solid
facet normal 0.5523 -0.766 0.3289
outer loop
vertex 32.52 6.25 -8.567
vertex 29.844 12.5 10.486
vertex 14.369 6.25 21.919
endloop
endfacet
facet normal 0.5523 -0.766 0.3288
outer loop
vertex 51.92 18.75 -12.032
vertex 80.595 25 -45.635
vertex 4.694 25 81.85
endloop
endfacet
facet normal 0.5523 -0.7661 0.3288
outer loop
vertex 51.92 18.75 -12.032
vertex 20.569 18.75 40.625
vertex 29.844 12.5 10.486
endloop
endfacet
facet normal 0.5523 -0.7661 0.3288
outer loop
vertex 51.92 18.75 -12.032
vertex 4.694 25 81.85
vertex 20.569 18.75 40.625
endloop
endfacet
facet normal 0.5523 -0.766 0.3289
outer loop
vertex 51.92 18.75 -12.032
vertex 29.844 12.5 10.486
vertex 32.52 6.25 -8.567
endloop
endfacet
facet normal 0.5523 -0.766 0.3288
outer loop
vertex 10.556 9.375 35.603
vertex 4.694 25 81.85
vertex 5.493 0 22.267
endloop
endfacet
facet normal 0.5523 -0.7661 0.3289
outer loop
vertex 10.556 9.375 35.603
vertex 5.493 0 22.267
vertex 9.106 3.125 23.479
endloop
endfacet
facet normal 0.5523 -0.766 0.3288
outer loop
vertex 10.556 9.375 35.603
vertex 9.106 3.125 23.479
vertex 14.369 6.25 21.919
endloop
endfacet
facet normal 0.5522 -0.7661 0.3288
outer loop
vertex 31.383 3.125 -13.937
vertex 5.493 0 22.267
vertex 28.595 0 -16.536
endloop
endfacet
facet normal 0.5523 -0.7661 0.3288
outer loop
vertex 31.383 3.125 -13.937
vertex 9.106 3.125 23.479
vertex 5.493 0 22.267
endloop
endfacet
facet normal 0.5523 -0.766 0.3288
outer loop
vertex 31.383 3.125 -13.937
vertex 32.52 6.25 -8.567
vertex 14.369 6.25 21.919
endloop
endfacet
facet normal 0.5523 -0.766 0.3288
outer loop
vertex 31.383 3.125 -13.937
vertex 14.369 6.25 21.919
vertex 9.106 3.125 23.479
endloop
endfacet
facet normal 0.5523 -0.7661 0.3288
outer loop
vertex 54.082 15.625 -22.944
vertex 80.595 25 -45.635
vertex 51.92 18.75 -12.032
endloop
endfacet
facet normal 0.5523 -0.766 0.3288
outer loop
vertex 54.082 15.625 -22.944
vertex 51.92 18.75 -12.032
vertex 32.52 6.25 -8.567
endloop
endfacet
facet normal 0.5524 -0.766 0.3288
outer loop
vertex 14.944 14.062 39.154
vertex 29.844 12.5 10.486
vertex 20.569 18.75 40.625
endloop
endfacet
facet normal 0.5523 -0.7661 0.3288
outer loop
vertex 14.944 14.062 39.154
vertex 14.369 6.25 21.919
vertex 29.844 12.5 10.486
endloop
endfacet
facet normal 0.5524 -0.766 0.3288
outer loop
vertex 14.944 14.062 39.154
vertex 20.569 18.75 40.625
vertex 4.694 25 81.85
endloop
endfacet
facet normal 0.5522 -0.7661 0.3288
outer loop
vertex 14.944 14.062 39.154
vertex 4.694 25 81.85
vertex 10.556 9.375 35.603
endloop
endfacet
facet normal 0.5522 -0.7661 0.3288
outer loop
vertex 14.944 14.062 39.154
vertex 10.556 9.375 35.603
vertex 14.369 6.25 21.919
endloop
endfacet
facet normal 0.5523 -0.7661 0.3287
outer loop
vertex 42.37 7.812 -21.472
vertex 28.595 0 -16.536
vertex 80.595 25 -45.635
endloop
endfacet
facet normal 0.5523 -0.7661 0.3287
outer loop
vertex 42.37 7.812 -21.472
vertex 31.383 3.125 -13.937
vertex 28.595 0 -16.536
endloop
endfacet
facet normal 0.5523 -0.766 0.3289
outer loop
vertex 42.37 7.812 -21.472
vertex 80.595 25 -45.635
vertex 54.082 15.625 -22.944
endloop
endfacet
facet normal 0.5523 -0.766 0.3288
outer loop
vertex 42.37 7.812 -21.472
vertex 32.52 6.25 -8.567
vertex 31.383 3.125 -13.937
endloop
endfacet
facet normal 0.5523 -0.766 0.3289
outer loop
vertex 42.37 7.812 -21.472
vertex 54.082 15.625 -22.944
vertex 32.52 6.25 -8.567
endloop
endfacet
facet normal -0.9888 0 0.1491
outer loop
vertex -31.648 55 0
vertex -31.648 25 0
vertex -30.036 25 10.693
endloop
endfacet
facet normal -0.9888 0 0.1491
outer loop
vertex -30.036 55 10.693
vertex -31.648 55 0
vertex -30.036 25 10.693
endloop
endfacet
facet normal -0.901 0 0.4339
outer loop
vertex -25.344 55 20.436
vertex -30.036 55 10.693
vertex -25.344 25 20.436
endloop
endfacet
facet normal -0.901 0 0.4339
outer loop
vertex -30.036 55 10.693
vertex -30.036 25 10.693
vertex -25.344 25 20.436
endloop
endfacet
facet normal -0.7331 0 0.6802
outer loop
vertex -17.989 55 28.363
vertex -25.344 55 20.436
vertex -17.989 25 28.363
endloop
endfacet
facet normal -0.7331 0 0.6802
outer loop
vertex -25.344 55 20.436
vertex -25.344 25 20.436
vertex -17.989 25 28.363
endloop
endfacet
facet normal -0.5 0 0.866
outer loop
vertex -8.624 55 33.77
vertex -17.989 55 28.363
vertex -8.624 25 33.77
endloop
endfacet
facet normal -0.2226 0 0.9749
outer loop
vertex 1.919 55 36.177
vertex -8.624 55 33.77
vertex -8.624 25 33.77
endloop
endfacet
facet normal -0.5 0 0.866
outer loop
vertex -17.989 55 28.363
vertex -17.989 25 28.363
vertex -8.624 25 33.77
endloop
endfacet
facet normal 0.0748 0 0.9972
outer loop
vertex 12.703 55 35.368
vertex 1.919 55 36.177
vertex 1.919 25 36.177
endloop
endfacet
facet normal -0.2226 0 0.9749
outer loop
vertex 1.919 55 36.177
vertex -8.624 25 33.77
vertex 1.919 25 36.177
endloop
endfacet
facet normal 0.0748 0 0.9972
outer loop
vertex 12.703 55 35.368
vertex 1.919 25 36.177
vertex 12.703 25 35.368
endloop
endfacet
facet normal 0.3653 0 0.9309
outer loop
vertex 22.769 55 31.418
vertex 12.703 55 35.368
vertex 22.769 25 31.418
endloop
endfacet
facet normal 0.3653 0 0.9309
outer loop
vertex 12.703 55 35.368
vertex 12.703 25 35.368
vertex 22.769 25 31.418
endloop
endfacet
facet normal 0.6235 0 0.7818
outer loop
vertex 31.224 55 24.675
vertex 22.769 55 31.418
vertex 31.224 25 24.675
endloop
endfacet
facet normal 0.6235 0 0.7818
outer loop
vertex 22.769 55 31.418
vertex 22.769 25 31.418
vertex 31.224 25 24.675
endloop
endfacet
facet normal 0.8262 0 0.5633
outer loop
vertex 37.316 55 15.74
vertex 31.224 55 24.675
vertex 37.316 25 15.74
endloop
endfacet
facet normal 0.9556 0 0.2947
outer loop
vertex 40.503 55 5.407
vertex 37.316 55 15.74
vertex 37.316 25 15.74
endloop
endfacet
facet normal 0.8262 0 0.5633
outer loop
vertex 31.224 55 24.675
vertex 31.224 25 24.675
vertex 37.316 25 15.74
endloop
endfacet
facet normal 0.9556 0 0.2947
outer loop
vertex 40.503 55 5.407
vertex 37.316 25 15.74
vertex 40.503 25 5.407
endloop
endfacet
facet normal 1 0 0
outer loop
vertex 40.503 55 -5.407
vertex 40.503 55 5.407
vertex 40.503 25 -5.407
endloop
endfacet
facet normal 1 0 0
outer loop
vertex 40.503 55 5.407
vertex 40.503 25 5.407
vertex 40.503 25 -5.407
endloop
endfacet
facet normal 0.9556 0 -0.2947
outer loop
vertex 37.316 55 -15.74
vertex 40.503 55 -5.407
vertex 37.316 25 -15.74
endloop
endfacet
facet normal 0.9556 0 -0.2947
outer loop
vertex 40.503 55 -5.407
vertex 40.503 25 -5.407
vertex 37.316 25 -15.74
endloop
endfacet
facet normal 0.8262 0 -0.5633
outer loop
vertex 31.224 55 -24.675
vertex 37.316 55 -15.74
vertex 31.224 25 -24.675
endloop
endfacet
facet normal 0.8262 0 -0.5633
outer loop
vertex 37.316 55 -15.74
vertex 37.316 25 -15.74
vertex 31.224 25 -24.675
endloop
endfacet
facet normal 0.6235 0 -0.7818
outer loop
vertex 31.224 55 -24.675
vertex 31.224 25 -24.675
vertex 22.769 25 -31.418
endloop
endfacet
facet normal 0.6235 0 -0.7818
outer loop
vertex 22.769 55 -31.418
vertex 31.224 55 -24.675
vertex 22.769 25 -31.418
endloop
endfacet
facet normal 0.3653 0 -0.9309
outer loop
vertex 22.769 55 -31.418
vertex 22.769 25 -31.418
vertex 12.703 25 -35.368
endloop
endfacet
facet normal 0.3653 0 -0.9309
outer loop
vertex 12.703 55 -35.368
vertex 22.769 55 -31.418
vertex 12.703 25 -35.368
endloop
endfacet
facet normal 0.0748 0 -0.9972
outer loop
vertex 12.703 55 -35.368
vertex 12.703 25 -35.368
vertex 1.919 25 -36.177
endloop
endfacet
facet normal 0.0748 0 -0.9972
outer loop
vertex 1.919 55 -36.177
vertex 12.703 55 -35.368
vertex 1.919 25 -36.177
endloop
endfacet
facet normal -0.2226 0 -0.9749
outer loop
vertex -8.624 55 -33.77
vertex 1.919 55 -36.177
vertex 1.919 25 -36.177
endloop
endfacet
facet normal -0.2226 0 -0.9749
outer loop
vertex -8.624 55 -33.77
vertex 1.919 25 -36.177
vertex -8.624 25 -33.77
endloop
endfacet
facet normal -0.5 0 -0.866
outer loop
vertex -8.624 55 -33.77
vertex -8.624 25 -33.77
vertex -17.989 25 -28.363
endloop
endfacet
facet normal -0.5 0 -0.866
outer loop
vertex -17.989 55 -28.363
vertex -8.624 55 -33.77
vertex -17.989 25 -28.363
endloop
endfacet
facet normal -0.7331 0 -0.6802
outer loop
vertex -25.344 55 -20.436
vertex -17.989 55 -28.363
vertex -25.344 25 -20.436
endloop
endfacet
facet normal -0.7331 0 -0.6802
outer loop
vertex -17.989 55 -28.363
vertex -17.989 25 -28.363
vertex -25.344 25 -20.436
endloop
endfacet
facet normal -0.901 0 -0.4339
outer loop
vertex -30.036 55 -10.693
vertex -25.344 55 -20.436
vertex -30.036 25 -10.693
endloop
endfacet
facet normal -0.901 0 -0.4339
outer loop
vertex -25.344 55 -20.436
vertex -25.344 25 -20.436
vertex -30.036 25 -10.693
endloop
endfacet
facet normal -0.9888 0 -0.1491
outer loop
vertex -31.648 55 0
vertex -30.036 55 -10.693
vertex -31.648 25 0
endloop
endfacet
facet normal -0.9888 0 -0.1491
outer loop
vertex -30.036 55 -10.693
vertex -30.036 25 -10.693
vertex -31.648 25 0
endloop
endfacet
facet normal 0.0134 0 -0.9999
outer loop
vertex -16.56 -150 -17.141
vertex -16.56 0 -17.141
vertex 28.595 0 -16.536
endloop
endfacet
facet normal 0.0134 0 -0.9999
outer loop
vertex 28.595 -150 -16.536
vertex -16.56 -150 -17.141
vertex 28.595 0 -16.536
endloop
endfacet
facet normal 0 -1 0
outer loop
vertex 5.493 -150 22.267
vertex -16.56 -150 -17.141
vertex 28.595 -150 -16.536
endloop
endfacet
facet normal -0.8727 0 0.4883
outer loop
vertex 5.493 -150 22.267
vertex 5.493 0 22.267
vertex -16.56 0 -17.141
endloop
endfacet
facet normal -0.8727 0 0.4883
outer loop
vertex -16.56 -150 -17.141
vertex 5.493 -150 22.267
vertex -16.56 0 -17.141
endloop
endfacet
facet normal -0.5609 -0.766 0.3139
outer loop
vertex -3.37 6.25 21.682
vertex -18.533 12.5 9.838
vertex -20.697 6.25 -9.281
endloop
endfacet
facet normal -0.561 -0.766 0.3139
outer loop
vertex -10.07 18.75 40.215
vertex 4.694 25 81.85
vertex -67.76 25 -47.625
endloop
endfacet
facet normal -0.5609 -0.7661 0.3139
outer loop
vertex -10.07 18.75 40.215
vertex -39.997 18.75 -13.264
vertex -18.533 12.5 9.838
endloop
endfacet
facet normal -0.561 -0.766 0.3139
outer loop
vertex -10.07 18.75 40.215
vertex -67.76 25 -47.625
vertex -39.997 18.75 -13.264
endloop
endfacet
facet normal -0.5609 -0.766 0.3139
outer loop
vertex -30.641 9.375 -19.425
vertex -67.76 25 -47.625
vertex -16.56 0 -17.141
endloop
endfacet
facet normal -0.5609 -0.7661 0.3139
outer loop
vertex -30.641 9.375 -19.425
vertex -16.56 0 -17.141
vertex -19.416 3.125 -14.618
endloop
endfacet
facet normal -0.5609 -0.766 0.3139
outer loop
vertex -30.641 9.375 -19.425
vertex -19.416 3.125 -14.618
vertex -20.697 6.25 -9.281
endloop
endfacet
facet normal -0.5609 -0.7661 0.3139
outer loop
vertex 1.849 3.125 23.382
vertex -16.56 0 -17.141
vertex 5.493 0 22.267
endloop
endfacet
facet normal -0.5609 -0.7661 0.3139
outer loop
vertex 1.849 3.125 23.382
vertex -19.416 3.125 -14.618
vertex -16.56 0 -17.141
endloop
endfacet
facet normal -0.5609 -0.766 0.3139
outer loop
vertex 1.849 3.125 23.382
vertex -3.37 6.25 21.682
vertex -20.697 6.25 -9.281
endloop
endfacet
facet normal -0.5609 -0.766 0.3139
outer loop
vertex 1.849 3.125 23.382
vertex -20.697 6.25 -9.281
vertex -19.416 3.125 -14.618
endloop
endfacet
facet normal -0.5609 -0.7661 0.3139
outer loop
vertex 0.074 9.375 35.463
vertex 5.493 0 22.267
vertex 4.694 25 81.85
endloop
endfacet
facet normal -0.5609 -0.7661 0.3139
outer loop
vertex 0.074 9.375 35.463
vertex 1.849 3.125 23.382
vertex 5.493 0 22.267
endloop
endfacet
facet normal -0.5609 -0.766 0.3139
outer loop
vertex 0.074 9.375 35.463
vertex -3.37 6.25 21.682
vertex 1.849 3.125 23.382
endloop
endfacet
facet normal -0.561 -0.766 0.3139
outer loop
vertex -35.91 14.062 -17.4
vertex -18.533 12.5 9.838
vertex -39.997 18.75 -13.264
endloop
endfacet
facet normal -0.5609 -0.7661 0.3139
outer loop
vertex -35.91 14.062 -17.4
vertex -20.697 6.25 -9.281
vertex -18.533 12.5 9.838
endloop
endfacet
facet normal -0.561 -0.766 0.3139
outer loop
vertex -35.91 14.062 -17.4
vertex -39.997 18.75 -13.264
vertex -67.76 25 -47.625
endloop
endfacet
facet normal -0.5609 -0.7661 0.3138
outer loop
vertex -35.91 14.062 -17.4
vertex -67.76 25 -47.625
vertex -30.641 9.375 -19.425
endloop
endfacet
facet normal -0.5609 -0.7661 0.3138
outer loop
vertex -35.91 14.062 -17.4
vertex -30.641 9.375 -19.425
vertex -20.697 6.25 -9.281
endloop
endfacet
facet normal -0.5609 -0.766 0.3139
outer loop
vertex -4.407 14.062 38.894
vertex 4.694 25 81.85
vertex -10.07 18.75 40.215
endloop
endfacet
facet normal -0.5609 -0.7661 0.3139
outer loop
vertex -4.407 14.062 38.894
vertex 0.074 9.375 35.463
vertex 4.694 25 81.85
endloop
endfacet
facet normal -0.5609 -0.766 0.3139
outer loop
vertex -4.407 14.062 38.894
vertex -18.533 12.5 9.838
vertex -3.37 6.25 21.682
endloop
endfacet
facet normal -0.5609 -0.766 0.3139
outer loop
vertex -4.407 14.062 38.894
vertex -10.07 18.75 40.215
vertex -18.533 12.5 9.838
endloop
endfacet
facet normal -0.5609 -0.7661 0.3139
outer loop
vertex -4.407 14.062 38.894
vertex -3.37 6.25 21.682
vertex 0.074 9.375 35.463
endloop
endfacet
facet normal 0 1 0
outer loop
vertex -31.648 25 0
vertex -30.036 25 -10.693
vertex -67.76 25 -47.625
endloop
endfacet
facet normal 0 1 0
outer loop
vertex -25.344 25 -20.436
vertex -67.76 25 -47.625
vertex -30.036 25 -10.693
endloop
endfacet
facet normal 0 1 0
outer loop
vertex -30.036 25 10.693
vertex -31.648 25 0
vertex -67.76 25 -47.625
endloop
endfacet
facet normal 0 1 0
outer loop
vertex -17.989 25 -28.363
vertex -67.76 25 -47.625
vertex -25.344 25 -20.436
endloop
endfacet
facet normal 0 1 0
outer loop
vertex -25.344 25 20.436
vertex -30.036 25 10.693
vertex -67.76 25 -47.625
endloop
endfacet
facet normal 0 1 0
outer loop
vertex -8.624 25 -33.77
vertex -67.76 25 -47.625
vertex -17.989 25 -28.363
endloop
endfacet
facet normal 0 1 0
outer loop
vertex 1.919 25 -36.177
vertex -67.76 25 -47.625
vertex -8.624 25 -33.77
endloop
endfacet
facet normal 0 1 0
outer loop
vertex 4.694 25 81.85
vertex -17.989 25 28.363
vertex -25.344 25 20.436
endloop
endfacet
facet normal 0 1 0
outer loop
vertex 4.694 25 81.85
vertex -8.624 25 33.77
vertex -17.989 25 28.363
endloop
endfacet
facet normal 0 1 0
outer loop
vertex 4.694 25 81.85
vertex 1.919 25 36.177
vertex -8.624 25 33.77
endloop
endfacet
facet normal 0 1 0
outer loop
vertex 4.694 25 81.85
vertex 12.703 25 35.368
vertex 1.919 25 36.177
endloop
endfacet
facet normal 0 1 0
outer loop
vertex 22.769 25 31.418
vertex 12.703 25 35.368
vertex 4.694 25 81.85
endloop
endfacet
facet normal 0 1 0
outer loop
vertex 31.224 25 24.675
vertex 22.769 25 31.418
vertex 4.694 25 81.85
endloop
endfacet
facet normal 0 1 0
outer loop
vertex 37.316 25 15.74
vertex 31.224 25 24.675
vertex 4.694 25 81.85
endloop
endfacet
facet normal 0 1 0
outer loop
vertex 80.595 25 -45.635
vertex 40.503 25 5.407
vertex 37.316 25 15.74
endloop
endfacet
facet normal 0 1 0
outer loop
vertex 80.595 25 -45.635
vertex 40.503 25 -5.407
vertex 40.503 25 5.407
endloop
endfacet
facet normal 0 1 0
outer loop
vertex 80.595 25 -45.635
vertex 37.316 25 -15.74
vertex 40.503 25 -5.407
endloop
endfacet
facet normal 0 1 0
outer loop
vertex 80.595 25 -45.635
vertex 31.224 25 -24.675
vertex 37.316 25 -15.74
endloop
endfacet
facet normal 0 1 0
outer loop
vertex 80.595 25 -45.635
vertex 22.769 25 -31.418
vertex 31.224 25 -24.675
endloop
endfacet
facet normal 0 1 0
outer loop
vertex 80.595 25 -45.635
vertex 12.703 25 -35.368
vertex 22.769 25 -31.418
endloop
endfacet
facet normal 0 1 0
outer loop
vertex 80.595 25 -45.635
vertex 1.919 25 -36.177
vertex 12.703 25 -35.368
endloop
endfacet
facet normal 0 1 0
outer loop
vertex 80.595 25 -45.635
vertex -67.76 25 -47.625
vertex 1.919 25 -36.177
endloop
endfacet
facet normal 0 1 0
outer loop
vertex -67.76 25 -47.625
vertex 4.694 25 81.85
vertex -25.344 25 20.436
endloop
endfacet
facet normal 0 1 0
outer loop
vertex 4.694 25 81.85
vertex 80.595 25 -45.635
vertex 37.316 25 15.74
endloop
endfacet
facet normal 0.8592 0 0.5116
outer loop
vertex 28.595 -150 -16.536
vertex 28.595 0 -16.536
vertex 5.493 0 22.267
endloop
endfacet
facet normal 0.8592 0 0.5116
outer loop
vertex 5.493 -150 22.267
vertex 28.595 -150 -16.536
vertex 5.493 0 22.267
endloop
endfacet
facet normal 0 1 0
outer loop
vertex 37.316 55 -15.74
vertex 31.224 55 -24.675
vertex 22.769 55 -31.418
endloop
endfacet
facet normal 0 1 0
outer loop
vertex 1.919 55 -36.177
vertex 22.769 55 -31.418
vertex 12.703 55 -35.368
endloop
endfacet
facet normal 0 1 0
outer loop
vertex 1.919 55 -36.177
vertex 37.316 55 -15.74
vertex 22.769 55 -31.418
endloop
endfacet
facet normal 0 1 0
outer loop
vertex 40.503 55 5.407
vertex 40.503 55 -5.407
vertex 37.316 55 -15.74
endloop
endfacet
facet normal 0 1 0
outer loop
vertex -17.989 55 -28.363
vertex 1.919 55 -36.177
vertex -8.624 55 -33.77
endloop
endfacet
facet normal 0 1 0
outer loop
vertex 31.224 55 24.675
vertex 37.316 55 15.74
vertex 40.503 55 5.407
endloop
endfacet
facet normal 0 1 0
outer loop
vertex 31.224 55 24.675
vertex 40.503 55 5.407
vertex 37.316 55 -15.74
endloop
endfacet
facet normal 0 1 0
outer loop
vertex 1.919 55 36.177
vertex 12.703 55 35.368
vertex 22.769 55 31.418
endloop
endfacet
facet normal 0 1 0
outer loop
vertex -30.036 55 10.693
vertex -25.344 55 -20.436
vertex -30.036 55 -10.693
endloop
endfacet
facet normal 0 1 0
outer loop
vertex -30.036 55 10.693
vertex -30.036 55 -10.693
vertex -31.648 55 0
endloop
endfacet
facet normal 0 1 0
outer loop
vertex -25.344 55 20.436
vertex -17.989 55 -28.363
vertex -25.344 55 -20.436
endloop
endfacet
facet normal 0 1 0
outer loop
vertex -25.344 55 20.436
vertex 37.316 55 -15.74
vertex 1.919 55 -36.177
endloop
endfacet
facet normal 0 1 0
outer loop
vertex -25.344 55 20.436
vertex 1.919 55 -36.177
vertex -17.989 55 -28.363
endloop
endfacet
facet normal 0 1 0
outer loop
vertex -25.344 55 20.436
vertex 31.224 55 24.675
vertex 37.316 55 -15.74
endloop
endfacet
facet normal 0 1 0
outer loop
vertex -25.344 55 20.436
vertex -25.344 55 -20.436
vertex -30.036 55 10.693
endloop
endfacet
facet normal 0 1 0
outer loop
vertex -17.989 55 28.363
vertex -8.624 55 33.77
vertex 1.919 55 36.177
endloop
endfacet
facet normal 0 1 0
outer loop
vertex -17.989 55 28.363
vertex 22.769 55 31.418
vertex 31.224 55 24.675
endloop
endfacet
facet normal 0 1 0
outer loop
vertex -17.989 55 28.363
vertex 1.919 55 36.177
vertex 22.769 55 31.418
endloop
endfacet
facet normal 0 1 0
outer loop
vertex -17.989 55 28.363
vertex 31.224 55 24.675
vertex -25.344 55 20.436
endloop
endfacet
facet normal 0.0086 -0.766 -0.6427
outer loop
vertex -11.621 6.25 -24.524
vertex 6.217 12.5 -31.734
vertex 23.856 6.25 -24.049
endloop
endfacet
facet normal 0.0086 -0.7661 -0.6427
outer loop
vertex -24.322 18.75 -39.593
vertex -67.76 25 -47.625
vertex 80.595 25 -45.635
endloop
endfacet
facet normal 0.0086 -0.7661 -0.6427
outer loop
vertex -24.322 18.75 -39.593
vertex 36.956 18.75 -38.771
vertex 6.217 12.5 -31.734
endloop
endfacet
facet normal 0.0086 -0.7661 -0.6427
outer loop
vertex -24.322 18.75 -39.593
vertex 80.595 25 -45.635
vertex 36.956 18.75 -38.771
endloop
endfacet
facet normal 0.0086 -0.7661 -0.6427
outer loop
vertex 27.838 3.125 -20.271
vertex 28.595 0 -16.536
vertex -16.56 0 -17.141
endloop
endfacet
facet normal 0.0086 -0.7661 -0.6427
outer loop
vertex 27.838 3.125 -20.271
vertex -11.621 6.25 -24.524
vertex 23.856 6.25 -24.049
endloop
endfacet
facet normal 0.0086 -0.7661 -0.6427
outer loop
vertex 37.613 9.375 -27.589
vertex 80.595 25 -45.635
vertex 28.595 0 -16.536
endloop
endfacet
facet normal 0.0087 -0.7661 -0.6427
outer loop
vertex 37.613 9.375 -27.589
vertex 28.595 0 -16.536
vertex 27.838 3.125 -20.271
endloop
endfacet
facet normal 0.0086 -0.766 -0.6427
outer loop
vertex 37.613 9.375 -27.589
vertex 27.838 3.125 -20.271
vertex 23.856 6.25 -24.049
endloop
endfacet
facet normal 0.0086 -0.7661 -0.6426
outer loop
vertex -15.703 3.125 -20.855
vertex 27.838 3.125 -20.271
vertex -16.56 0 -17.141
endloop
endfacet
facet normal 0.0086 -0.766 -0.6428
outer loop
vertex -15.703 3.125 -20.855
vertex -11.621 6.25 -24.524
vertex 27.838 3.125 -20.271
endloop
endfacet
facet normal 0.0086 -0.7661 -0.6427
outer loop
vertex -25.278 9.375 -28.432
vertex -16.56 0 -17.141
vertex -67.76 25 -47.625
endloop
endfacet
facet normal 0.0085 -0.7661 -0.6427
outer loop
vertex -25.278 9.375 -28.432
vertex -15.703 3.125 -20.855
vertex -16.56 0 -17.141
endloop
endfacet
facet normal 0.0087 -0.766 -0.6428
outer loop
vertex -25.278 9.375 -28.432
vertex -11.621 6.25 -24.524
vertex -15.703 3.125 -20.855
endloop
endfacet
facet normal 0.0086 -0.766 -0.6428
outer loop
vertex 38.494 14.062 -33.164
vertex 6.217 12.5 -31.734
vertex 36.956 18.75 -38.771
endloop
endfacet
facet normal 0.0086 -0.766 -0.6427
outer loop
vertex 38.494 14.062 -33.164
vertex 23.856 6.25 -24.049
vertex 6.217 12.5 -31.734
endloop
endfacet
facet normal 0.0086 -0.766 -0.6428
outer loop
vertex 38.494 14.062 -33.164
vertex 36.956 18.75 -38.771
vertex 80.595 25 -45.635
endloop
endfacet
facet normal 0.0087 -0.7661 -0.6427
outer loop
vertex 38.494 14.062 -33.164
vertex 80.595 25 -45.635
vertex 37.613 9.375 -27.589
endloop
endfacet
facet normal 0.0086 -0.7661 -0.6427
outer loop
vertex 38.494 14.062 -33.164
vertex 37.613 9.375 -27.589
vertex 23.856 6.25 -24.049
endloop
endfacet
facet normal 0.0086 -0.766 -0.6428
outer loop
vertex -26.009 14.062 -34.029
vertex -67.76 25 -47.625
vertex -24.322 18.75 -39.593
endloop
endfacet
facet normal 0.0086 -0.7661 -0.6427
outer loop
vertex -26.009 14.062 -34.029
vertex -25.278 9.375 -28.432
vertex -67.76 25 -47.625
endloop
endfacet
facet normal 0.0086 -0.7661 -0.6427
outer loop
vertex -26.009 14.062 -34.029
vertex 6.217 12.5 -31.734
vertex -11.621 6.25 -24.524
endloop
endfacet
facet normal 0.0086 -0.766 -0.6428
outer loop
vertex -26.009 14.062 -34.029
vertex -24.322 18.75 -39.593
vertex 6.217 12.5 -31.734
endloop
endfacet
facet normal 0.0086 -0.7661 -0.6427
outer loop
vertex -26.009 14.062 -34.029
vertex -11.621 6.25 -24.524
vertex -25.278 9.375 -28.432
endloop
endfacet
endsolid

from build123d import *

# Parameters (mm, degrees)
F1_DEPTH = 150
F2_DEPTH = 25
F2_TAPER = -50
F3_R     = 36.2779782861
F4_DEPTH = 30


with BuildPart() as f1:
    # F0 (on Front) → F1 (new body)
    with BuildSketch(Plane.XZ):
        Polygon((-16.5601376103, -17.1414369862), (28.5954256631, -16.5359374457), (5.4932660423, 22.267177701), align=None)
    extrude(amount=F1_DEPTH)

    # F1_face (on face) → F2 (join)
    with BuildSketch(Plane(origin=(5.842851365, 0, -3.8033989103), x_dir=(1, 0, 0), z_dir=(0, 1, 0))):
        Polygon((-22.4029889753, 13.3380380759), (-0.3495853227, -26.0705766113), (22.752574298, 12.7325385354), align=None)
    extrude(amount=F2_DEPTH, taper=F2_TAPER)

    # F3 (on face) → F4 (join)
    with BuildSketch(Plane(origin=(0, 25, 0), x_dir=(-1, 0, 0), z_dir=(0, 1, 0))):
        with Locations((-4.6302080154, 0)):
            Circle(F3_R)
    extrude(amount=F4_DEPTH)


solid = f1.part
